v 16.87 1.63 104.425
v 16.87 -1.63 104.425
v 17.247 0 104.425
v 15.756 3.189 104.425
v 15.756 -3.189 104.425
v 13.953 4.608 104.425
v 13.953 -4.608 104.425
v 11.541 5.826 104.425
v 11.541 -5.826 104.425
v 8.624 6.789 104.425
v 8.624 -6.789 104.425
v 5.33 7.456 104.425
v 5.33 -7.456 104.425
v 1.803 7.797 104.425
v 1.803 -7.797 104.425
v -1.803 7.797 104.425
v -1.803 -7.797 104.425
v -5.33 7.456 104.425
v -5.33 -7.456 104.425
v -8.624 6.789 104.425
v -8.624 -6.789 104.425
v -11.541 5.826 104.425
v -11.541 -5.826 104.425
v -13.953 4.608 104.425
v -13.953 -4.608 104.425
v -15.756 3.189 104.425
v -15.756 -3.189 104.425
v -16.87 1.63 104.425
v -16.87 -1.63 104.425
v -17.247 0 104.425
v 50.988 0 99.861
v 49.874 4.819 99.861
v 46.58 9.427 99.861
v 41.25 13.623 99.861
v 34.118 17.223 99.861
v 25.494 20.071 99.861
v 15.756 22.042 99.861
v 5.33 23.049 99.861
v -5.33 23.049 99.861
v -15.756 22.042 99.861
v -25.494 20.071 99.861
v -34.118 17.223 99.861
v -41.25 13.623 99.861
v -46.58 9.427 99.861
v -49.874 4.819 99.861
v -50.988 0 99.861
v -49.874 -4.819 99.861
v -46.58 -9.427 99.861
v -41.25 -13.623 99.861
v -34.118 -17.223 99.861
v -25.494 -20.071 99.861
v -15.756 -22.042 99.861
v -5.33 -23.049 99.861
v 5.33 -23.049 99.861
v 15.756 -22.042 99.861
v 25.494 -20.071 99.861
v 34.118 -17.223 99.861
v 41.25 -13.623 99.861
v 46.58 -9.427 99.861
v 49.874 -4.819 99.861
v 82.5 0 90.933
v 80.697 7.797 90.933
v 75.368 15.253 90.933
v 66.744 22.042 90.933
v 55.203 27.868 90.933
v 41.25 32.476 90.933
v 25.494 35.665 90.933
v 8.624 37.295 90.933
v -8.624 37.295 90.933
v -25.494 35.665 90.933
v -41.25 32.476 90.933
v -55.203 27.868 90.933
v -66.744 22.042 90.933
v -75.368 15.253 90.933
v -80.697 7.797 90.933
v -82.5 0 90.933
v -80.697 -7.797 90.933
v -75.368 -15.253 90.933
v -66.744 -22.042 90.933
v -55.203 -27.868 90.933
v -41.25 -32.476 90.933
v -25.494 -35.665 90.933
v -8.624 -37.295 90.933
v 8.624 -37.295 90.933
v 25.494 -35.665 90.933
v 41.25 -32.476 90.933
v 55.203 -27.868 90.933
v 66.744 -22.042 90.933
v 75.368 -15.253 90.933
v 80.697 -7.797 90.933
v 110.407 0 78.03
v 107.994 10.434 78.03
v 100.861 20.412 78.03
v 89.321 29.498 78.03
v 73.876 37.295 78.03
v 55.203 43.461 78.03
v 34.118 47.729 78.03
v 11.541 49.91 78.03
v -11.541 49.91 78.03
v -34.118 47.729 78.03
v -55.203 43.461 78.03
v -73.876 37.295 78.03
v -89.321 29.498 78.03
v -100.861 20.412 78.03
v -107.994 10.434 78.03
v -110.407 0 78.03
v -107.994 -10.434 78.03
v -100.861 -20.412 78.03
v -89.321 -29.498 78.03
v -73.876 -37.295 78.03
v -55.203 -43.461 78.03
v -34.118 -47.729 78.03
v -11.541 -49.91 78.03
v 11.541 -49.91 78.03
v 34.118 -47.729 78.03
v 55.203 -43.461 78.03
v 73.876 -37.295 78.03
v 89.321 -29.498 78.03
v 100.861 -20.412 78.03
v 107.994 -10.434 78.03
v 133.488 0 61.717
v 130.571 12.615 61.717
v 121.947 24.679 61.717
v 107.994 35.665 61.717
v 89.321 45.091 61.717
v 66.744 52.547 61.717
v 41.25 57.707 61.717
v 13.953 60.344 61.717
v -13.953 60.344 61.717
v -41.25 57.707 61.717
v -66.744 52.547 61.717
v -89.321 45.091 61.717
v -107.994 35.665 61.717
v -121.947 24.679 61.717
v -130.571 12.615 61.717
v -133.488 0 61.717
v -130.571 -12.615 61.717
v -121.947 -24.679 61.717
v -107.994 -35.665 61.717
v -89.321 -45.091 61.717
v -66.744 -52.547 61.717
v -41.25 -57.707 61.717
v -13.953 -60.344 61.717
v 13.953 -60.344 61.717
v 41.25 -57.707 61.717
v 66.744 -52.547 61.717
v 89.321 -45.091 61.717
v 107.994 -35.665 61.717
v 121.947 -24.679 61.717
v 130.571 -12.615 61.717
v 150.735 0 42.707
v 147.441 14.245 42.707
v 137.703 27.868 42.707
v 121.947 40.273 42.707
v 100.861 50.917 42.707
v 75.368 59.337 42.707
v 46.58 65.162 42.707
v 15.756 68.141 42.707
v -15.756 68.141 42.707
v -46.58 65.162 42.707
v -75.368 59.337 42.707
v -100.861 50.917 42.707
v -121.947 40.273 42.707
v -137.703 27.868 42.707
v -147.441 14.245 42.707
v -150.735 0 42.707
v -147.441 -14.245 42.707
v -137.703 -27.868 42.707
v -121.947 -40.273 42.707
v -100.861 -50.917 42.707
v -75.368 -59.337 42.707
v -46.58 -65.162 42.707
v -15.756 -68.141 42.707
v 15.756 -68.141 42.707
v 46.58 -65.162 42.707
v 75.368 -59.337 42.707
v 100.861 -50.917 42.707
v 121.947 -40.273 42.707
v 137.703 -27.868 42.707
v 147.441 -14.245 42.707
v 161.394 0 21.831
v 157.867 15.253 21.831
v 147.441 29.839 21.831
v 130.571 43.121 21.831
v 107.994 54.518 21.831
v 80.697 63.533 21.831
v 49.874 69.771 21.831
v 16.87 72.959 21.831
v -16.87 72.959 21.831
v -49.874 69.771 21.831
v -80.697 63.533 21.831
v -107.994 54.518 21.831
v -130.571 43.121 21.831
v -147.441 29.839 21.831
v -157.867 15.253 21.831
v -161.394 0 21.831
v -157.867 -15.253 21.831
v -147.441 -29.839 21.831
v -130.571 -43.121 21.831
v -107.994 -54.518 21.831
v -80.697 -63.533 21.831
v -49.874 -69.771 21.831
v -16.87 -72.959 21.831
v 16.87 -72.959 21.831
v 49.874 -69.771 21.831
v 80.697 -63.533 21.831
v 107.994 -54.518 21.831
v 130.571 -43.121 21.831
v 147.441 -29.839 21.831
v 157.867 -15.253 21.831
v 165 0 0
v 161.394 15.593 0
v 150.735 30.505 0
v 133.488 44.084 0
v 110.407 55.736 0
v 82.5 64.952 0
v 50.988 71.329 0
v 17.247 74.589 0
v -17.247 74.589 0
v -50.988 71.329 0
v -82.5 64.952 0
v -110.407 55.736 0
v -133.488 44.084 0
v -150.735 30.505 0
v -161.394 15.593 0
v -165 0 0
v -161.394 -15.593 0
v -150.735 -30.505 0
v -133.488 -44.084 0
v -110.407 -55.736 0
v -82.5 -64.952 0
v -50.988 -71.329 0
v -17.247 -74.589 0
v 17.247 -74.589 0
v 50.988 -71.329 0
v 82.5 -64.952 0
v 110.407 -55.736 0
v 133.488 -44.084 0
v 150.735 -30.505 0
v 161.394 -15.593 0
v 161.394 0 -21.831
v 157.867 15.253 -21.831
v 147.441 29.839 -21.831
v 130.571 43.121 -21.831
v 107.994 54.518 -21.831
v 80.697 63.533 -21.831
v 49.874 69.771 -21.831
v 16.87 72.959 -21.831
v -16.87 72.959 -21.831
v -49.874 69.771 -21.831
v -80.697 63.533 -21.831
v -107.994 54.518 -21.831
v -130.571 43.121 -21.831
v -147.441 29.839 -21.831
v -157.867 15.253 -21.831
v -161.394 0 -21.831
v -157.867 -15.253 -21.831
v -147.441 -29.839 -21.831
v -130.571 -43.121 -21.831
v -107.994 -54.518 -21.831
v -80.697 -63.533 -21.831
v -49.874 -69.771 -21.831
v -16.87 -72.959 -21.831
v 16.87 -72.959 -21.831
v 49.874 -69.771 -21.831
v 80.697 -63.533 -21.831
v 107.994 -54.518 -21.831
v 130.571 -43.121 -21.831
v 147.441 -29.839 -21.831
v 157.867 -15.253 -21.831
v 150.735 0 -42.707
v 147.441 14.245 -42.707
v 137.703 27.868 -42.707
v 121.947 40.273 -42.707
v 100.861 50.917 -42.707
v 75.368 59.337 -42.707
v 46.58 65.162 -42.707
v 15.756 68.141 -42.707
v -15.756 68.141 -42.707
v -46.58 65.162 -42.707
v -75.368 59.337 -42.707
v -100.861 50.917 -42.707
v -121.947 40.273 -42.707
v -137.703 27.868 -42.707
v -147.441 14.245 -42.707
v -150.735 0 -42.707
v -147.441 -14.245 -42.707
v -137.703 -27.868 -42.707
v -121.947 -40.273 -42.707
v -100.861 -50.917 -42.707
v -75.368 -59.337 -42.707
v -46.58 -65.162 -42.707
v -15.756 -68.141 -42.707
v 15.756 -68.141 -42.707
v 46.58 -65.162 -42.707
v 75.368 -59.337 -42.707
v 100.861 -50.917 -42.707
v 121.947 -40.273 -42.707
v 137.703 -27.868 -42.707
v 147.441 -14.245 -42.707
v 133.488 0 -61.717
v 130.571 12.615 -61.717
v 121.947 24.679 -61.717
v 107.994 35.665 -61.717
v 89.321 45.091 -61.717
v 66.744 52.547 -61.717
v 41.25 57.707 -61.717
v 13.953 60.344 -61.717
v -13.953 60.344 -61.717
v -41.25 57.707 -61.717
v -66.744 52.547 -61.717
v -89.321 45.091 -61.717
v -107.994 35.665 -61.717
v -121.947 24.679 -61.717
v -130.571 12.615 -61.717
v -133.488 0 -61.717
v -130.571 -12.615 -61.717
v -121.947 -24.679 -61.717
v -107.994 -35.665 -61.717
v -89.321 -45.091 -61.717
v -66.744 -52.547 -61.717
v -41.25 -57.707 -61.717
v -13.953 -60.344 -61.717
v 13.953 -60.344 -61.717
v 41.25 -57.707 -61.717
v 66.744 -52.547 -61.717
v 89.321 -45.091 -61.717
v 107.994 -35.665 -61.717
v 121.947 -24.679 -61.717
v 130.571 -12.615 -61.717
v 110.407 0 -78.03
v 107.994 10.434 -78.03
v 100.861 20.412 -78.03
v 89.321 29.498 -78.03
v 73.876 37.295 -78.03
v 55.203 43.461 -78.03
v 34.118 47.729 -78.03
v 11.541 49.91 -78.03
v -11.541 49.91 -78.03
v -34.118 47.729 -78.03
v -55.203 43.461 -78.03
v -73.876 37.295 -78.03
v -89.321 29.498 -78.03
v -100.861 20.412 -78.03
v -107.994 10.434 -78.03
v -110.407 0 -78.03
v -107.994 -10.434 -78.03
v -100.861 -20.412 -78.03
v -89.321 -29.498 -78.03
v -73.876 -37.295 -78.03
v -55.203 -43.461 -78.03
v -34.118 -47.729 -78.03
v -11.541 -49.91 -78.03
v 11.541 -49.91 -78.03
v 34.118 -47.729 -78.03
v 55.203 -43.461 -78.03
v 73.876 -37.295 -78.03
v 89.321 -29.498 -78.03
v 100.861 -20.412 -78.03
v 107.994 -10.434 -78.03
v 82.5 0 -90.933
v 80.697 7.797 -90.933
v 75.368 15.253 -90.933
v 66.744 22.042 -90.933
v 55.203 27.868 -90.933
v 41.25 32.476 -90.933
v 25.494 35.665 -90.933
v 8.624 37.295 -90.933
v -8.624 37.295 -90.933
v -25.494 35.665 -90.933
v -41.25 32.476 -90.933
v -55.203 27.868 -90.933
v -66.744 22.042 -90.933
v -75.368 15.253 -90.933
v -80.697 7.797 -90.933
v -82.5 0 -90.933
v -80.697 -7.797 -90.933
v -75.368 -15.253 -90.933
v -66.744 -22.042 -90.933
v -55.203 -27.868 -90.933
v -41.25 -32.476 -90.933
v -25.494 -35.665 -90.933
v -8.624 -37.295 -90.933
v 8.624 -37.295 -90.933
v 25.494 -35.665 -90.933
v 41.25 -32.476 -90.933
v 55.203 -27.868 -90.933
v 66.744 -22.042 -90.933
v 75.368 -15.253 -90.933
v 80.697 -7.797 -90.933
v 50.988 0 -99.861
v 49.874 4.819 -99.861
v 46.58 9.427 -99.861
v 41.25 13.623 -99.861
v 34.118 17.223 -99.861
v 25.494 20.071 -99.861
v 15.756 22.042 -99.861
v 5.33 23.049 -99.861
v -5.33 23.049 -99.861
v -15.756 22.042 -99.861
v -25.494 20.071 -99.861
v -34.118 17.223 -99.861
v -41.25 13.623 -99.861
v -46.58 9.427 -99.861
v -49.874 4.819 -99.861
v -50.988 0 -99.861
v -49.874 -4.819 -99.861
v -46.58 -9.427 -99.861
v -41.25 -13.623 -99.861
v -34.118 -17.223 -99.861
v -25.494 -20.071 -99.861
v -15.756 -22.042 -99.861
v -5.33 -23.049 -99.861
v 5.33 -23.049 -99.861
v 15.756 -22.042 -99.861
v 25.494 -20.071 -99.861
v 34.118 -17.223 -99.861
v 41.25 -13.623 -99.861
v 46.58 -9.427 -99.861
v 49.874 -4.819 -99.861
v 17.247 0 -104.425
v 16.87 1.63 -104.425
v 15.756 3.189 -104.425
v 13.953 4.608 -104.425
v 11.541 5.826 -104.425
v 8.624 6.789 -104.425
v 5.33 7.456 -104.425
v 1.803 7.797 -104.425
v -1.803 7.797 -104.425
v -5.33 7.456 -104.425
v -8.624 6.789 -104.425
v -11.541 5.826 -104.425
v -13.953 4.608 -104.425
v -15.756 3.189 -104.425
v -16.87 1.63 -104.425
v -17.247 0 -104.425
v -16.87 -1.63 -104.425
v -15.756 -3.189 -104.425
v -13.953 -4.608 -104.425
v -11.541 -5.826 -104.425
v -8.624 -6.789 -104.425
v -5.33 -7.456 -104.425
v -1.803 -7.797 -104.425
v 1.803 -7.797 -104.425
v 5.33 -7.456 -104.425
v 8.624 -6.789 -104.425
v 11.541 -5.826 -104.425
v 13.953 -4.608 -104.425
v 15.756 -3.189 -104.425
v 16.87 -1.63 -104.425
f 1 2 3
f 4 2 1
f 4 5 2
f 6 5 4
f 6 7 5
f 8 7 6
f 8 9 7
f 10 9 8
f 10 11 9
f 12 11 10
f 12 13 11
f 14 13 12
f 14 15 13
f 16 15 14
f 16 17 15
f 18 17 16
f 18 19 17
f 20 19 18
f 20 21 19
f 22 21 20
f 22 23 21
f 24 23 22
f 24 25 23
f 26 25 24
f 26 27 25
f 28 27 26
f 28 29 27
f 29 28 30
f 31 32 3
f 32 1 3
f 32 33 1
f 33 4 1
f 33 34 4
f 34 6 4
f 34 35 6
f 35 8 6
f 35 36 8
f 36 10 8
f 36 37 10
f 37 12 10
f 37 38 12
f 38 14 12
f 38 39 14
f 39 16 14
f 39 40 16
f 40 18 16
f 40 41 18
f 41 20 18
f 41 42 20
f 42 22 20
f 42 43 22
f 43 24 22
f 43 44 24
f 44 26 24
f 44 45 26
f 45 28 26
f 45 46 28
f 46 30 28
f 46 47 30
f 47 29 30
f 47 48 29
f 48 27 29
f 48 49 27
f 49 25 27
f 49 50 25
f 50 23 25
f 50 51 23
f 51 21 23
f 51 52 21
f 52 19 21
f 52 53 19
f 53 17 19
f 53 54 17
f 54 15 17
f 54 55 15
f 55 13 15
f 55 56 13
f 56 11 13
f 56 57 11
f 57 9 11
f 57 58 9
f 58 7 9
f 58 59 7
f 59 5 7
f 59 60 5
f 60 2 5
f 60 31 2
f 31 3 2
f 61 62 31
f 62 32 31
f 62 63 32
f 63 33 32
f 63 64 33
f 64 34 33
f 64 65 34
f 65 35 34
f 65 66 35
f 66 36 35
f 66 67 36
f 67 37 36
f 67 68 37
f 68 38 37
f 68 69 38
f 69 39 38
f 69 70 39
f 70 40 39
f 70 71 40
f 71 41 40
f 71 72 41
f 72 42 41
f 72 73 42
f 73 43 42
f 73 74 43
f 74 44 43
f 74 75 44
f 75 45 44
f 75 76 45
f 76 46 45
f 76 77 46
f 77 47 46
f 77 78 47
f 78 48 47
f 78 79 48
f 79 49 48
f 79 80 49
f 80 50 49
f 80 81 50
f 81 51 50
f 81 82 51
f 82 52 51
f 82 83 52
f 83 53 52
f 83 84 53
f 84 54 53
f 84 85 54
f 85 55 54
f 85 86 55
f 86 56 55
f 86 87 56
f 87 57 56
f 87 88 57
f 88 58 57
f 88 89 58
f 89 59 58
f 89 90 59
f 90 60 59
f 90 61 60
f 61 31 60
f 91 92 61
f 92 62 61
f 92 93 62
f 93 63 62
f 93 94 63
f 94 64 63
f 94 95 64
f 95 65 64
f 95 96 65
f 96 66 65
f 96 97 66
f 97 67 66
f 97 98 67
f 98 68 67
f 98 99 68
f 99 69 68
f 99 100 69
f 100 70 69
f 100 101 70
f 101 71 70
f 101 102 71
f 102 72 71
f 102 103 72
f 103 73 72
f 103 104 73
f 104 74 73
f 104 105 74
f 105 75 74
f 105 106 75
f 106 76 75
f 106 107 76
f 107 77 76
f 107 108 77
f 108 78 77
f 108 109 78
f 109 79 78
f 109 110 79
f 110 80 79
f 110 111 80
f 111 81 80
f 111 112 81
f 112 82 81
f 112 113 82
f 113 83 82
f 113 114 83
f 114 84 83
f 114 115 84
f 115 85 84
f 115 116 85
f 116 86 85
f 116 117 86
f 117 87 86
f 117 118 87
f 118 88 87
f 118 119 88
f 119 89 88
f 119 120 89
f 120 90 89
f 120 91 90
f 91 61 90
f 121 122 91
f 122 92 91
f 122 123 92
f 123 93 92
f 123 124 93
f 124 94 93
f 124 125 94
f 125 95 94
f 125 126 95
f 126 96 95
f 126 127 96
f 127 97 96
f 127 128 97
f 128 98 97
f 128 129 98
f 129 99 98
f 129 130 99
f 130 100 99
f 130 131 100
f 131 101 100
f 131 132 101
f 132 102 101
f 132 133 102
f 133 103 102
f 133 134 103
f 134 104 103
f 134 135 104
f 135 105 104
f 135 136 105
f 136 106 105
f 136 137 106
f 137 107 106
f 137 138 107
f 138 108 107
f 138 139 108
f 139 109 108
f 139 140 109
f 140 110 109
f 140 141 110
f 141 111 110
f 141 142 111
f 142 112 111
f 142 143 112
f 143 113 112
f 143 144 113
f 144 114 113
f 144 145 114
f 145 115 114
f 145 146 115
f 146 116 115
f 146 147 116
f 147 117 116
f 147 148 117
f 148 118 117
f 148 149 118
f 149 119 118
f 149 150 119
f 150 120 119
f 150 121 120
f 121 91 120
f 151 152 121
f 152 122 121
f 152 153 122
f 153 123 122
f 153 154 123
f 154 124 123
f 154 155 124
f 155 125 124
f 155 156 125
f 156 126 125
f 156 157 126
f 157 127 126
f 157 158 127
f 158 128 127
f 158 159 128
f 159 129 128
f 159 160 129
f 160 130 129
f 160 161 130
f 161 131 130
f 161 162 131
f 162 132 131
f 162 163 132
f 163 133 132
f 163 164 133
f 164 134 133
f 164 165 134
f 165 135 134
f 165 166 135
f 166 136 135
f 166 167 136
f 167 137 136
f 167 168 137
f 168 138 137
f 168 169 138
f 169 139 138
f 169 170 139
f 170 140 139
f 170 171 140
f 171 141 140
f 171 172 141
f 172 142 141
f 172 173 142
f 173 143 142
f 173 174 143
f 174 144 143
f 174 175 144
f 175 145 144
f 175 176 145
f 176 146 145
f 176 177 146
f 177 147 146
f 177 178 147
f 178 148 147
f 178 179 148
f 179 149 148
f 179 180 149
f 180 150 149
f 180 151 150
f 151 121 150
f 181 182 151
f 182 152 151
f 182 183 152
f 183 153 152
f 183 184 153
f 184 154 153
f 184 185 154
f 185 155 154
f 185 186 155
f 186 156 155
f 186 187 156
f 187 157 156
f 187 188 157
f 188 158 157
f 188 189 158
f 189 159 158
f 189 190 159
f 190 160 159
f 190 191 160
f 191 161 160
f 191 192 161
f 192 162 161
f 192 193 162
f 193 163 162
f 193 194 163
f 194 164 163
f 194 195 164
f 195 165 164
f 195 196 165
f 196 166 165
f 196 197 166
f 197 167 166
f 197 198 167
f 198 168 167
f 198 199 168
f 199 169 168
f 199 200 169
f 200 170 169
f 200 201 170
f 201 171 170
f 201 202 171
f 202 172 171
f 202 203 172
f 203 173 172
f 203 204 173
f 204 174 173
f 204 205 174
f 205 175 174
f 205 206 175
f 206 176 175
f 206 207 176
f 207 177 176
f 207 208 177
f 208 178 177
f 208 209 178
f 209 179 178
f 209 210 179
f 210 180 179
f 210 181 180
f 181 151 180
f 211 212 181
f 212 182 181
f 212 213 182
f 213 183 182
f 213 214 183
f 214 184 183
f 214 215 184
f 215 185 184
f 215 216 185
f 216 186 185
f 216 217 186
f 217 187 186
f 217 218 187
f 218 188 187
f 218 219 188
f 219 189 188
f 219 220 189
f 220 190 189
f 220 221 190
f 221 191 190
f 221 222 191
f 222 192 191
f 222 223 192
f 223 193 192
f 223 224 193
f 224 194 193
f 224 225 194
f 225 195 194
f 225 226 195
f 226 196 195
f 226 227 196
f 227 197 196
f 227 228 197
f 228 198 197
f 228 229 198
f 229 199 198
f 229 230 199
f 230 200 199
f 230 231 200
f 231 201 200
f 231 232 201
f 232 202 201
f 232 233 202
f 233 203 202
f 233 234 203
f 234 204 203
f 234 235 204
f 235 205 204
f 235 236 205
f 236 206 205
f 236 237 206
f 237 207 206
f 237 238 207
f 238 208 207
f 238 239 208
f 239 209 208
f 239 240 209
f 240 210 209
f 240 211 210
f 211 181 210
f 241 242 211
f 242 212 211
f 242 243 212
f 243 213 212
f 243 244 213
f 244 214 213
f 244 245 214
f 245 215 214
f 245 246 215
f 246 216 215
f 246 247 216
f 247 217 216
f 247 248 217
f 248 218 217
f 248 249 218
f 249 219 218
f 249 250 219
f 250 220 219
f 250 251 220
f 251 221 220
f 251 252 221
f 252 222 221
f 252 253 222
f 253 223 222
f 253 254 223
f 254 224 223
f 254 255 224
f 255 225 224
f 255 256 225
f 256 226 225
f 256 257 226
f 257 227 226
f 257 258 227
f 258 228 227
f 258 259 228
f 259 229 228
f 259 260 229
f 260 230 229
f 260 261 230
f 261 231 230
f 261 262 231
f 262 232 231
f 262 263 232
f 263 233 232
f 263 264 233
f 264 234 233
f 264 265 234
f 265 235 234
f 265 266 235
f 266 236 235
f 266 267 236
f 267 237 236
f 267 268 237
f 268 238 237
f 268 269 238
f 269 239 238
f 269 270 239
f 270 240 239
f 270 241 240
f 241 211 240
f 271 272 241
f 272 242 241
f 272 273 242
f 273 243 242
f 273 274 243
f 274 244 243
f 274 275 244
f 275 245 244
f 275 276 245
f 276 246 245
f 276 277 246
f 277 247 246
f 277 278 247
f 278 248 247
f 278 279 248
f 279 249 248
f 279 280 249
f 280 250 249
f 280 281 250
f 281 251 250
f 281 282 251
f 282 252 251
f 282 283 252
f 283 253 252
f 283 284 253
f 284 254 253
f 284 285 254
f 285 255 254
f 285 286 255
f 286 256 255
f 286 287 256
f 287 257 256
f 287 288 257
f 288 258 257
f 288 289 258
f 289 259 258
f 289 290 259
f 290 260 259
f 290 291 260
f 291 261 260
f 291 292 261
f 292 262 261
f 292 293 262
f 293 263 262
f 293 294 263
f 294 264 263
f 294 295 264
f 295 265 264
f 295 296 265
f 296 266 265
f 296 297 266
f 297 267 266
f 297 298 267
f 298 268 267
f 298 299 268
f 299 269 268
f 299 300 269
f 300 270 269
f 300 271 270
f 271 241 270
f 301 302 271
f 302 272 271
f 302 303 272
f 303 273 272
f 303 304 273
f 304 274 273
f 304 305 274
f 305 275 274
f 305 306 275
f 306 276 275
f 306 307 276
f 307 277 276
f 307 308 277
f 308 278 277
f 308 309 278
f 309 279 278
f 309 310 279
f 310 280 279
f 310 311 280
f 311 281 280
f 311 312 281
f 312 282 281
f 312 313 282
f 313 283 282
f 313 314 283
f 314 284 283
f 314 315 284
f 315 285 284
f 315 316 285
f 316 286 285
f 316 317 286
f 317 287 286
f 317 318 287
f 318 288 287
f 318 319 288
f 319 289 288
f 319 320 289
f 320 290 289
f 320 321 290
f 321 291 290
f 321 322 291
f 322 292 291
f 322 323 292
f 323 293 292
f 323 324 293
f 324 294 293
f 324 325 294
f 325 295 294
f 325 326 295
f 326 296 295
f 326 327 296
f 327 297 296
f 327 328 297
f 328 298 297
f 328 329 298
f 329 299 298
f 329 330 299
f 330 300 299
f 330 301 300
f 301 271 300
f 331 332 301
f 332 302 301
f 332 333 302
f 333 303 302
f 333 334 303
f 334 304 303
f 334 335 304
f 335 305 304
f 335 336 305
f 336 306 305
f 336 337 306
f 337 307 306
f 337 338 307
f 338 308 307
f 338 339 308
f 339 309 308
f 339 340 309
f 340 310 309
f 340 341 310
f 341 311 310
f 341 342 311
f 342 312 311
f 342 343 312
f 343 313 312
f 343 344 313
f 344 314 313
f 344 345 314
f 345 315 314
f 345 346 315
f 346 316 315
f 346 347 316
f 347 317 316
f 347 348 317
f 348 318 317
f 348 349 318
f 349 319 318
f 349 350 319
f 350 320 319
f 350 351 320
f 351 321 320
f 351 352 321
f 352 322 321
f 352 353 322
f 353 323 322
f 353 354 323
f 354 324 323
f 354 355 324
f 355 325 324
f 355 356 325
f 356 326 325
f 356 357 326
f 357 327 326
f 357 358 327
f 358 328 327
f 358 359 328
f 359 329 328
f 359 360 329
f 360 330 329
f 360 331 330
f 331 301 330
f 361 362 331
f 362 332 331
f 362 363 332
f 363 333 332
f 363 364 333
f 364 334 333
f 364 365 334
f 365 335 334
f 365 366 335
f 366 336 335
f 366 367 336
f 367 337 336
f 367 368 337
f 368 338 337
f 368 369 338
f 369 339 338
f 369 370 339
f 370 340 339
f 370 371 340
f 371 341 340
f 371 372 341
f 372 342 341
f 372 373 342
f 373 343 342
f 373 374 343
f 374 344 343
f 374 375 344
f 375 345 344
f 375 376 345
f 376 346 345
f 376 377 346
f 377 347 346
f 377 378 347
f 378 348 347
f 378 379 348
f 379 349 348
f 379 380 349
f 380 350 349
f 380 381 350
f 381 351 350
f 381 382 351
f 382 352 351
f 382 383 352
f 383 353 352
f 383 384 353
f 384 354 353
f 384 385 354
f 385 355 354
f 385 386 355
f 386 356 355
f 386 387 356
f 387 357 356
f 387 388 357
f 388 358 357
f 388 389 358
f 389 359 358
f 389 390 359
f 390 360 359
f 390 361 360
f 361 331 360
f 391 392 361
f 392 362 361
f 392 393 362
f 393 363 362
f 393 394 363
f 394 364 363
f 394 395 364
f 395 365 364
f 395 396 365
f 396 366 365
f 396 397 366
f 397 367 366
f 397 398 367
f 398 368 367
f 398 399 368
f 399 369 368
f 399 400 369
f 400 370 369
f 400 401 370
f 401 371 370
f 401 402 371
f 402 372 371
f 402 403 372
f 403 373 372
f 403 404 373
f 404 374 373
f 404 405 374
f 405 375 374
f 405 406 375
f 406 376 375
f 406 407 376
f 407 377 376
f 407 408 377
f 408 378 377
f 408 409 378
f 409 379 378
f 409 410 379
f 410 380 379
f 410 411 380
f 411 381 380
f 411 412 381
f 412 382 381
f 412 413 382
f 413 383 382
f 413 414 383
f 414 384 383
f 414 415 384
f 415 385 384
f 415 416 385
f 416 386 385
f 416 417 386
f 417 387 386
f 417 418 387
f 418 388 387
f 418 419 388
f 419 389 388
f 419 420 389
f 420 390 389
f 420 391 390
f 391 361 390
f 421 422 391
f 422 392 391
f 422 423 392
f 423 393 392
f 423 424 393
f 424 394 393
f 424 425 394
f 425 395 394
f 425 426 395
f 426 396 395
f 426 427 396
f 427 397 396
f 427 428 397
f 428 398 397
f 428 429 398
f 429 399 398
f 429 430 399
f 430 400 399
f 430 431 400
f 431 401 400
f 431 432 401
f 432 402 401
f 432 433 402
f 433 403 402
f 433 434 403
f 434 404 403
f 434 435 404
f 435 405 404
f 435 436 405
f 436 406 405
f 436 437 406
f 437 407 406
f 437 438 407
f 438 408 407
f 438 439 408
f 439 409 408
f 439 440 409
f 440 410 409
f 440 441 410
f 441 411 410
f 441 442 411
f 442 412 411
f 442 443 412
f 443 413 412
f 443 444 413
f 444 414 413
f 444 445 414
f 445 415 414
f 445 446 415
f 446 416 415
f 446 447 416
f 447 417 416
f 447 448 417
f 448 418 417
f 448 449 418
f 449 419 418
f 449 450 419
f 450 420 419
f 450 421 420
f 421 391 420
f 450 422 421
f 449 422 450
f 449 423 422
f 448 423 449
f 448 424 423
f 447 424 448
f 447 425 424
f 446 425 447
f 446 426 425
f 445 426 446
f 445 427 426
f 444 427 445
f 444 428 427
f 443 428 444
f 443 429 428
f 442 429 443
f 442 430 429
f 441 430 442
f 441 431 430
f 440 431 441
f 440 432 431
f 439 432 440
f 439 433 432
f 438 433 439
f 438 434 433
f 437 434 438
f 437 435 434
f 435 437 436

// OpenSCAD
// Generated by SolidPython 1.0.1 on 2020-07-29 00:46:49


scale(v = [11, 5, 7]) {
	sphere(r = 15);
}
/***********************************************
*********      SolidPython code:      **********
************************************************
 
# import packages: SolidPython
from solid import *
from solid.utils import *
from itertools import chain, combinations, permutations


class Resize:

    def __init__(self, scad_file):
        self.scad_file = scad_file
        #self.scad_file = import_scad(scad_file)
        # cone/cylinder param:
        self.r1 = 0
        self.r2 = 0
        self.h = 0
        # rectangular prism param:
        self.w = 0
        self.l = 0
        # ellipse param:
        self.r = 0

    # import OpenScad code (file name corresponds to shape)


    # classify shape + parameters
    def assign(self, param1, param2, param3):
        if self.scad_file == 'cone.scad':
            self.r1 = param1
            self.r2 = param2
            self.h = param3
        elif self.scad_file == 'cylinder.scad':
            self.r1 = param1
            self.r2 = param2
            self.h = param3
        elif self.scad_file == 'rectangularPrism.scad':
            self.h = param1
            self.l = param2
            self.w = param3
        else:
            self.r = param1
            self.h = param2

    # resize parameters
    def iterate(self):
        x = range(3, 20, 2)
        i = 1
        if self.scad_file == 'cone.scad':
            tempList = list(permutations(x, 2))
            for temp in tempList:
                param1 = temp[0]
                param2 = temp[1]
                filepath = 'produced_scad_files/' + 'cone' + str(param1) + '_' + str(param2) + '_' + '.scad'
                scad_render_to_file(cylinder(h=param1, r1=param2, r2=0), filepath)

        elif self.scad_file == 'cylinder.scad':
            tempList = list(permutations(x, 3))
            for temp in tempList:
                param1 = temp[0]
                param2 = temp[1]
                filepath = 'produced_scad_files/' + 'cylinder' + str(param1) + '_' + str(param2) + '_' + '.scad'
                scad_render_to_file(cylinder(h=param1, r1=param2, r2=param2), filepath)

        elif self.scad_file == 'rectangularPrism.scad':
            tempList = list(permutations(x, 3))
            for temp in tempList:
                param1 = temp[0]
                param2 = temp[1]
                param3 = temp[2]
                filepath = 'produced_scad_files/' + 'rectangularPrism' + str(param1) + '_' + str(param2) + '_' + str(
                    param3) + '.scad'
                scad_render_to_file(cube(size=(param1, param2, param3)), filepath)

        elif self.scad_file == 'ellipse.scad':
            tempList = list(permutations(x, 4))
            for temp in tempList:
                param1 = temp[0]
                param2 = temp[1]
                param3 = temp[2]
                param4 = temp[3]
                filepath = 'produced_scad_files/' + 'ellipse' + str(param1) + '_' + str(param2) + '_' + str(param3) + '_' + str(param4) + '.scad'
                scad_render_to_file(scale([param1, param2, param3])(sphere(r=param4)), filepath)

    def render_to_scadfile(self):
        scad_render_to_file(scad, 'example.scad') 
 
************************************************/
